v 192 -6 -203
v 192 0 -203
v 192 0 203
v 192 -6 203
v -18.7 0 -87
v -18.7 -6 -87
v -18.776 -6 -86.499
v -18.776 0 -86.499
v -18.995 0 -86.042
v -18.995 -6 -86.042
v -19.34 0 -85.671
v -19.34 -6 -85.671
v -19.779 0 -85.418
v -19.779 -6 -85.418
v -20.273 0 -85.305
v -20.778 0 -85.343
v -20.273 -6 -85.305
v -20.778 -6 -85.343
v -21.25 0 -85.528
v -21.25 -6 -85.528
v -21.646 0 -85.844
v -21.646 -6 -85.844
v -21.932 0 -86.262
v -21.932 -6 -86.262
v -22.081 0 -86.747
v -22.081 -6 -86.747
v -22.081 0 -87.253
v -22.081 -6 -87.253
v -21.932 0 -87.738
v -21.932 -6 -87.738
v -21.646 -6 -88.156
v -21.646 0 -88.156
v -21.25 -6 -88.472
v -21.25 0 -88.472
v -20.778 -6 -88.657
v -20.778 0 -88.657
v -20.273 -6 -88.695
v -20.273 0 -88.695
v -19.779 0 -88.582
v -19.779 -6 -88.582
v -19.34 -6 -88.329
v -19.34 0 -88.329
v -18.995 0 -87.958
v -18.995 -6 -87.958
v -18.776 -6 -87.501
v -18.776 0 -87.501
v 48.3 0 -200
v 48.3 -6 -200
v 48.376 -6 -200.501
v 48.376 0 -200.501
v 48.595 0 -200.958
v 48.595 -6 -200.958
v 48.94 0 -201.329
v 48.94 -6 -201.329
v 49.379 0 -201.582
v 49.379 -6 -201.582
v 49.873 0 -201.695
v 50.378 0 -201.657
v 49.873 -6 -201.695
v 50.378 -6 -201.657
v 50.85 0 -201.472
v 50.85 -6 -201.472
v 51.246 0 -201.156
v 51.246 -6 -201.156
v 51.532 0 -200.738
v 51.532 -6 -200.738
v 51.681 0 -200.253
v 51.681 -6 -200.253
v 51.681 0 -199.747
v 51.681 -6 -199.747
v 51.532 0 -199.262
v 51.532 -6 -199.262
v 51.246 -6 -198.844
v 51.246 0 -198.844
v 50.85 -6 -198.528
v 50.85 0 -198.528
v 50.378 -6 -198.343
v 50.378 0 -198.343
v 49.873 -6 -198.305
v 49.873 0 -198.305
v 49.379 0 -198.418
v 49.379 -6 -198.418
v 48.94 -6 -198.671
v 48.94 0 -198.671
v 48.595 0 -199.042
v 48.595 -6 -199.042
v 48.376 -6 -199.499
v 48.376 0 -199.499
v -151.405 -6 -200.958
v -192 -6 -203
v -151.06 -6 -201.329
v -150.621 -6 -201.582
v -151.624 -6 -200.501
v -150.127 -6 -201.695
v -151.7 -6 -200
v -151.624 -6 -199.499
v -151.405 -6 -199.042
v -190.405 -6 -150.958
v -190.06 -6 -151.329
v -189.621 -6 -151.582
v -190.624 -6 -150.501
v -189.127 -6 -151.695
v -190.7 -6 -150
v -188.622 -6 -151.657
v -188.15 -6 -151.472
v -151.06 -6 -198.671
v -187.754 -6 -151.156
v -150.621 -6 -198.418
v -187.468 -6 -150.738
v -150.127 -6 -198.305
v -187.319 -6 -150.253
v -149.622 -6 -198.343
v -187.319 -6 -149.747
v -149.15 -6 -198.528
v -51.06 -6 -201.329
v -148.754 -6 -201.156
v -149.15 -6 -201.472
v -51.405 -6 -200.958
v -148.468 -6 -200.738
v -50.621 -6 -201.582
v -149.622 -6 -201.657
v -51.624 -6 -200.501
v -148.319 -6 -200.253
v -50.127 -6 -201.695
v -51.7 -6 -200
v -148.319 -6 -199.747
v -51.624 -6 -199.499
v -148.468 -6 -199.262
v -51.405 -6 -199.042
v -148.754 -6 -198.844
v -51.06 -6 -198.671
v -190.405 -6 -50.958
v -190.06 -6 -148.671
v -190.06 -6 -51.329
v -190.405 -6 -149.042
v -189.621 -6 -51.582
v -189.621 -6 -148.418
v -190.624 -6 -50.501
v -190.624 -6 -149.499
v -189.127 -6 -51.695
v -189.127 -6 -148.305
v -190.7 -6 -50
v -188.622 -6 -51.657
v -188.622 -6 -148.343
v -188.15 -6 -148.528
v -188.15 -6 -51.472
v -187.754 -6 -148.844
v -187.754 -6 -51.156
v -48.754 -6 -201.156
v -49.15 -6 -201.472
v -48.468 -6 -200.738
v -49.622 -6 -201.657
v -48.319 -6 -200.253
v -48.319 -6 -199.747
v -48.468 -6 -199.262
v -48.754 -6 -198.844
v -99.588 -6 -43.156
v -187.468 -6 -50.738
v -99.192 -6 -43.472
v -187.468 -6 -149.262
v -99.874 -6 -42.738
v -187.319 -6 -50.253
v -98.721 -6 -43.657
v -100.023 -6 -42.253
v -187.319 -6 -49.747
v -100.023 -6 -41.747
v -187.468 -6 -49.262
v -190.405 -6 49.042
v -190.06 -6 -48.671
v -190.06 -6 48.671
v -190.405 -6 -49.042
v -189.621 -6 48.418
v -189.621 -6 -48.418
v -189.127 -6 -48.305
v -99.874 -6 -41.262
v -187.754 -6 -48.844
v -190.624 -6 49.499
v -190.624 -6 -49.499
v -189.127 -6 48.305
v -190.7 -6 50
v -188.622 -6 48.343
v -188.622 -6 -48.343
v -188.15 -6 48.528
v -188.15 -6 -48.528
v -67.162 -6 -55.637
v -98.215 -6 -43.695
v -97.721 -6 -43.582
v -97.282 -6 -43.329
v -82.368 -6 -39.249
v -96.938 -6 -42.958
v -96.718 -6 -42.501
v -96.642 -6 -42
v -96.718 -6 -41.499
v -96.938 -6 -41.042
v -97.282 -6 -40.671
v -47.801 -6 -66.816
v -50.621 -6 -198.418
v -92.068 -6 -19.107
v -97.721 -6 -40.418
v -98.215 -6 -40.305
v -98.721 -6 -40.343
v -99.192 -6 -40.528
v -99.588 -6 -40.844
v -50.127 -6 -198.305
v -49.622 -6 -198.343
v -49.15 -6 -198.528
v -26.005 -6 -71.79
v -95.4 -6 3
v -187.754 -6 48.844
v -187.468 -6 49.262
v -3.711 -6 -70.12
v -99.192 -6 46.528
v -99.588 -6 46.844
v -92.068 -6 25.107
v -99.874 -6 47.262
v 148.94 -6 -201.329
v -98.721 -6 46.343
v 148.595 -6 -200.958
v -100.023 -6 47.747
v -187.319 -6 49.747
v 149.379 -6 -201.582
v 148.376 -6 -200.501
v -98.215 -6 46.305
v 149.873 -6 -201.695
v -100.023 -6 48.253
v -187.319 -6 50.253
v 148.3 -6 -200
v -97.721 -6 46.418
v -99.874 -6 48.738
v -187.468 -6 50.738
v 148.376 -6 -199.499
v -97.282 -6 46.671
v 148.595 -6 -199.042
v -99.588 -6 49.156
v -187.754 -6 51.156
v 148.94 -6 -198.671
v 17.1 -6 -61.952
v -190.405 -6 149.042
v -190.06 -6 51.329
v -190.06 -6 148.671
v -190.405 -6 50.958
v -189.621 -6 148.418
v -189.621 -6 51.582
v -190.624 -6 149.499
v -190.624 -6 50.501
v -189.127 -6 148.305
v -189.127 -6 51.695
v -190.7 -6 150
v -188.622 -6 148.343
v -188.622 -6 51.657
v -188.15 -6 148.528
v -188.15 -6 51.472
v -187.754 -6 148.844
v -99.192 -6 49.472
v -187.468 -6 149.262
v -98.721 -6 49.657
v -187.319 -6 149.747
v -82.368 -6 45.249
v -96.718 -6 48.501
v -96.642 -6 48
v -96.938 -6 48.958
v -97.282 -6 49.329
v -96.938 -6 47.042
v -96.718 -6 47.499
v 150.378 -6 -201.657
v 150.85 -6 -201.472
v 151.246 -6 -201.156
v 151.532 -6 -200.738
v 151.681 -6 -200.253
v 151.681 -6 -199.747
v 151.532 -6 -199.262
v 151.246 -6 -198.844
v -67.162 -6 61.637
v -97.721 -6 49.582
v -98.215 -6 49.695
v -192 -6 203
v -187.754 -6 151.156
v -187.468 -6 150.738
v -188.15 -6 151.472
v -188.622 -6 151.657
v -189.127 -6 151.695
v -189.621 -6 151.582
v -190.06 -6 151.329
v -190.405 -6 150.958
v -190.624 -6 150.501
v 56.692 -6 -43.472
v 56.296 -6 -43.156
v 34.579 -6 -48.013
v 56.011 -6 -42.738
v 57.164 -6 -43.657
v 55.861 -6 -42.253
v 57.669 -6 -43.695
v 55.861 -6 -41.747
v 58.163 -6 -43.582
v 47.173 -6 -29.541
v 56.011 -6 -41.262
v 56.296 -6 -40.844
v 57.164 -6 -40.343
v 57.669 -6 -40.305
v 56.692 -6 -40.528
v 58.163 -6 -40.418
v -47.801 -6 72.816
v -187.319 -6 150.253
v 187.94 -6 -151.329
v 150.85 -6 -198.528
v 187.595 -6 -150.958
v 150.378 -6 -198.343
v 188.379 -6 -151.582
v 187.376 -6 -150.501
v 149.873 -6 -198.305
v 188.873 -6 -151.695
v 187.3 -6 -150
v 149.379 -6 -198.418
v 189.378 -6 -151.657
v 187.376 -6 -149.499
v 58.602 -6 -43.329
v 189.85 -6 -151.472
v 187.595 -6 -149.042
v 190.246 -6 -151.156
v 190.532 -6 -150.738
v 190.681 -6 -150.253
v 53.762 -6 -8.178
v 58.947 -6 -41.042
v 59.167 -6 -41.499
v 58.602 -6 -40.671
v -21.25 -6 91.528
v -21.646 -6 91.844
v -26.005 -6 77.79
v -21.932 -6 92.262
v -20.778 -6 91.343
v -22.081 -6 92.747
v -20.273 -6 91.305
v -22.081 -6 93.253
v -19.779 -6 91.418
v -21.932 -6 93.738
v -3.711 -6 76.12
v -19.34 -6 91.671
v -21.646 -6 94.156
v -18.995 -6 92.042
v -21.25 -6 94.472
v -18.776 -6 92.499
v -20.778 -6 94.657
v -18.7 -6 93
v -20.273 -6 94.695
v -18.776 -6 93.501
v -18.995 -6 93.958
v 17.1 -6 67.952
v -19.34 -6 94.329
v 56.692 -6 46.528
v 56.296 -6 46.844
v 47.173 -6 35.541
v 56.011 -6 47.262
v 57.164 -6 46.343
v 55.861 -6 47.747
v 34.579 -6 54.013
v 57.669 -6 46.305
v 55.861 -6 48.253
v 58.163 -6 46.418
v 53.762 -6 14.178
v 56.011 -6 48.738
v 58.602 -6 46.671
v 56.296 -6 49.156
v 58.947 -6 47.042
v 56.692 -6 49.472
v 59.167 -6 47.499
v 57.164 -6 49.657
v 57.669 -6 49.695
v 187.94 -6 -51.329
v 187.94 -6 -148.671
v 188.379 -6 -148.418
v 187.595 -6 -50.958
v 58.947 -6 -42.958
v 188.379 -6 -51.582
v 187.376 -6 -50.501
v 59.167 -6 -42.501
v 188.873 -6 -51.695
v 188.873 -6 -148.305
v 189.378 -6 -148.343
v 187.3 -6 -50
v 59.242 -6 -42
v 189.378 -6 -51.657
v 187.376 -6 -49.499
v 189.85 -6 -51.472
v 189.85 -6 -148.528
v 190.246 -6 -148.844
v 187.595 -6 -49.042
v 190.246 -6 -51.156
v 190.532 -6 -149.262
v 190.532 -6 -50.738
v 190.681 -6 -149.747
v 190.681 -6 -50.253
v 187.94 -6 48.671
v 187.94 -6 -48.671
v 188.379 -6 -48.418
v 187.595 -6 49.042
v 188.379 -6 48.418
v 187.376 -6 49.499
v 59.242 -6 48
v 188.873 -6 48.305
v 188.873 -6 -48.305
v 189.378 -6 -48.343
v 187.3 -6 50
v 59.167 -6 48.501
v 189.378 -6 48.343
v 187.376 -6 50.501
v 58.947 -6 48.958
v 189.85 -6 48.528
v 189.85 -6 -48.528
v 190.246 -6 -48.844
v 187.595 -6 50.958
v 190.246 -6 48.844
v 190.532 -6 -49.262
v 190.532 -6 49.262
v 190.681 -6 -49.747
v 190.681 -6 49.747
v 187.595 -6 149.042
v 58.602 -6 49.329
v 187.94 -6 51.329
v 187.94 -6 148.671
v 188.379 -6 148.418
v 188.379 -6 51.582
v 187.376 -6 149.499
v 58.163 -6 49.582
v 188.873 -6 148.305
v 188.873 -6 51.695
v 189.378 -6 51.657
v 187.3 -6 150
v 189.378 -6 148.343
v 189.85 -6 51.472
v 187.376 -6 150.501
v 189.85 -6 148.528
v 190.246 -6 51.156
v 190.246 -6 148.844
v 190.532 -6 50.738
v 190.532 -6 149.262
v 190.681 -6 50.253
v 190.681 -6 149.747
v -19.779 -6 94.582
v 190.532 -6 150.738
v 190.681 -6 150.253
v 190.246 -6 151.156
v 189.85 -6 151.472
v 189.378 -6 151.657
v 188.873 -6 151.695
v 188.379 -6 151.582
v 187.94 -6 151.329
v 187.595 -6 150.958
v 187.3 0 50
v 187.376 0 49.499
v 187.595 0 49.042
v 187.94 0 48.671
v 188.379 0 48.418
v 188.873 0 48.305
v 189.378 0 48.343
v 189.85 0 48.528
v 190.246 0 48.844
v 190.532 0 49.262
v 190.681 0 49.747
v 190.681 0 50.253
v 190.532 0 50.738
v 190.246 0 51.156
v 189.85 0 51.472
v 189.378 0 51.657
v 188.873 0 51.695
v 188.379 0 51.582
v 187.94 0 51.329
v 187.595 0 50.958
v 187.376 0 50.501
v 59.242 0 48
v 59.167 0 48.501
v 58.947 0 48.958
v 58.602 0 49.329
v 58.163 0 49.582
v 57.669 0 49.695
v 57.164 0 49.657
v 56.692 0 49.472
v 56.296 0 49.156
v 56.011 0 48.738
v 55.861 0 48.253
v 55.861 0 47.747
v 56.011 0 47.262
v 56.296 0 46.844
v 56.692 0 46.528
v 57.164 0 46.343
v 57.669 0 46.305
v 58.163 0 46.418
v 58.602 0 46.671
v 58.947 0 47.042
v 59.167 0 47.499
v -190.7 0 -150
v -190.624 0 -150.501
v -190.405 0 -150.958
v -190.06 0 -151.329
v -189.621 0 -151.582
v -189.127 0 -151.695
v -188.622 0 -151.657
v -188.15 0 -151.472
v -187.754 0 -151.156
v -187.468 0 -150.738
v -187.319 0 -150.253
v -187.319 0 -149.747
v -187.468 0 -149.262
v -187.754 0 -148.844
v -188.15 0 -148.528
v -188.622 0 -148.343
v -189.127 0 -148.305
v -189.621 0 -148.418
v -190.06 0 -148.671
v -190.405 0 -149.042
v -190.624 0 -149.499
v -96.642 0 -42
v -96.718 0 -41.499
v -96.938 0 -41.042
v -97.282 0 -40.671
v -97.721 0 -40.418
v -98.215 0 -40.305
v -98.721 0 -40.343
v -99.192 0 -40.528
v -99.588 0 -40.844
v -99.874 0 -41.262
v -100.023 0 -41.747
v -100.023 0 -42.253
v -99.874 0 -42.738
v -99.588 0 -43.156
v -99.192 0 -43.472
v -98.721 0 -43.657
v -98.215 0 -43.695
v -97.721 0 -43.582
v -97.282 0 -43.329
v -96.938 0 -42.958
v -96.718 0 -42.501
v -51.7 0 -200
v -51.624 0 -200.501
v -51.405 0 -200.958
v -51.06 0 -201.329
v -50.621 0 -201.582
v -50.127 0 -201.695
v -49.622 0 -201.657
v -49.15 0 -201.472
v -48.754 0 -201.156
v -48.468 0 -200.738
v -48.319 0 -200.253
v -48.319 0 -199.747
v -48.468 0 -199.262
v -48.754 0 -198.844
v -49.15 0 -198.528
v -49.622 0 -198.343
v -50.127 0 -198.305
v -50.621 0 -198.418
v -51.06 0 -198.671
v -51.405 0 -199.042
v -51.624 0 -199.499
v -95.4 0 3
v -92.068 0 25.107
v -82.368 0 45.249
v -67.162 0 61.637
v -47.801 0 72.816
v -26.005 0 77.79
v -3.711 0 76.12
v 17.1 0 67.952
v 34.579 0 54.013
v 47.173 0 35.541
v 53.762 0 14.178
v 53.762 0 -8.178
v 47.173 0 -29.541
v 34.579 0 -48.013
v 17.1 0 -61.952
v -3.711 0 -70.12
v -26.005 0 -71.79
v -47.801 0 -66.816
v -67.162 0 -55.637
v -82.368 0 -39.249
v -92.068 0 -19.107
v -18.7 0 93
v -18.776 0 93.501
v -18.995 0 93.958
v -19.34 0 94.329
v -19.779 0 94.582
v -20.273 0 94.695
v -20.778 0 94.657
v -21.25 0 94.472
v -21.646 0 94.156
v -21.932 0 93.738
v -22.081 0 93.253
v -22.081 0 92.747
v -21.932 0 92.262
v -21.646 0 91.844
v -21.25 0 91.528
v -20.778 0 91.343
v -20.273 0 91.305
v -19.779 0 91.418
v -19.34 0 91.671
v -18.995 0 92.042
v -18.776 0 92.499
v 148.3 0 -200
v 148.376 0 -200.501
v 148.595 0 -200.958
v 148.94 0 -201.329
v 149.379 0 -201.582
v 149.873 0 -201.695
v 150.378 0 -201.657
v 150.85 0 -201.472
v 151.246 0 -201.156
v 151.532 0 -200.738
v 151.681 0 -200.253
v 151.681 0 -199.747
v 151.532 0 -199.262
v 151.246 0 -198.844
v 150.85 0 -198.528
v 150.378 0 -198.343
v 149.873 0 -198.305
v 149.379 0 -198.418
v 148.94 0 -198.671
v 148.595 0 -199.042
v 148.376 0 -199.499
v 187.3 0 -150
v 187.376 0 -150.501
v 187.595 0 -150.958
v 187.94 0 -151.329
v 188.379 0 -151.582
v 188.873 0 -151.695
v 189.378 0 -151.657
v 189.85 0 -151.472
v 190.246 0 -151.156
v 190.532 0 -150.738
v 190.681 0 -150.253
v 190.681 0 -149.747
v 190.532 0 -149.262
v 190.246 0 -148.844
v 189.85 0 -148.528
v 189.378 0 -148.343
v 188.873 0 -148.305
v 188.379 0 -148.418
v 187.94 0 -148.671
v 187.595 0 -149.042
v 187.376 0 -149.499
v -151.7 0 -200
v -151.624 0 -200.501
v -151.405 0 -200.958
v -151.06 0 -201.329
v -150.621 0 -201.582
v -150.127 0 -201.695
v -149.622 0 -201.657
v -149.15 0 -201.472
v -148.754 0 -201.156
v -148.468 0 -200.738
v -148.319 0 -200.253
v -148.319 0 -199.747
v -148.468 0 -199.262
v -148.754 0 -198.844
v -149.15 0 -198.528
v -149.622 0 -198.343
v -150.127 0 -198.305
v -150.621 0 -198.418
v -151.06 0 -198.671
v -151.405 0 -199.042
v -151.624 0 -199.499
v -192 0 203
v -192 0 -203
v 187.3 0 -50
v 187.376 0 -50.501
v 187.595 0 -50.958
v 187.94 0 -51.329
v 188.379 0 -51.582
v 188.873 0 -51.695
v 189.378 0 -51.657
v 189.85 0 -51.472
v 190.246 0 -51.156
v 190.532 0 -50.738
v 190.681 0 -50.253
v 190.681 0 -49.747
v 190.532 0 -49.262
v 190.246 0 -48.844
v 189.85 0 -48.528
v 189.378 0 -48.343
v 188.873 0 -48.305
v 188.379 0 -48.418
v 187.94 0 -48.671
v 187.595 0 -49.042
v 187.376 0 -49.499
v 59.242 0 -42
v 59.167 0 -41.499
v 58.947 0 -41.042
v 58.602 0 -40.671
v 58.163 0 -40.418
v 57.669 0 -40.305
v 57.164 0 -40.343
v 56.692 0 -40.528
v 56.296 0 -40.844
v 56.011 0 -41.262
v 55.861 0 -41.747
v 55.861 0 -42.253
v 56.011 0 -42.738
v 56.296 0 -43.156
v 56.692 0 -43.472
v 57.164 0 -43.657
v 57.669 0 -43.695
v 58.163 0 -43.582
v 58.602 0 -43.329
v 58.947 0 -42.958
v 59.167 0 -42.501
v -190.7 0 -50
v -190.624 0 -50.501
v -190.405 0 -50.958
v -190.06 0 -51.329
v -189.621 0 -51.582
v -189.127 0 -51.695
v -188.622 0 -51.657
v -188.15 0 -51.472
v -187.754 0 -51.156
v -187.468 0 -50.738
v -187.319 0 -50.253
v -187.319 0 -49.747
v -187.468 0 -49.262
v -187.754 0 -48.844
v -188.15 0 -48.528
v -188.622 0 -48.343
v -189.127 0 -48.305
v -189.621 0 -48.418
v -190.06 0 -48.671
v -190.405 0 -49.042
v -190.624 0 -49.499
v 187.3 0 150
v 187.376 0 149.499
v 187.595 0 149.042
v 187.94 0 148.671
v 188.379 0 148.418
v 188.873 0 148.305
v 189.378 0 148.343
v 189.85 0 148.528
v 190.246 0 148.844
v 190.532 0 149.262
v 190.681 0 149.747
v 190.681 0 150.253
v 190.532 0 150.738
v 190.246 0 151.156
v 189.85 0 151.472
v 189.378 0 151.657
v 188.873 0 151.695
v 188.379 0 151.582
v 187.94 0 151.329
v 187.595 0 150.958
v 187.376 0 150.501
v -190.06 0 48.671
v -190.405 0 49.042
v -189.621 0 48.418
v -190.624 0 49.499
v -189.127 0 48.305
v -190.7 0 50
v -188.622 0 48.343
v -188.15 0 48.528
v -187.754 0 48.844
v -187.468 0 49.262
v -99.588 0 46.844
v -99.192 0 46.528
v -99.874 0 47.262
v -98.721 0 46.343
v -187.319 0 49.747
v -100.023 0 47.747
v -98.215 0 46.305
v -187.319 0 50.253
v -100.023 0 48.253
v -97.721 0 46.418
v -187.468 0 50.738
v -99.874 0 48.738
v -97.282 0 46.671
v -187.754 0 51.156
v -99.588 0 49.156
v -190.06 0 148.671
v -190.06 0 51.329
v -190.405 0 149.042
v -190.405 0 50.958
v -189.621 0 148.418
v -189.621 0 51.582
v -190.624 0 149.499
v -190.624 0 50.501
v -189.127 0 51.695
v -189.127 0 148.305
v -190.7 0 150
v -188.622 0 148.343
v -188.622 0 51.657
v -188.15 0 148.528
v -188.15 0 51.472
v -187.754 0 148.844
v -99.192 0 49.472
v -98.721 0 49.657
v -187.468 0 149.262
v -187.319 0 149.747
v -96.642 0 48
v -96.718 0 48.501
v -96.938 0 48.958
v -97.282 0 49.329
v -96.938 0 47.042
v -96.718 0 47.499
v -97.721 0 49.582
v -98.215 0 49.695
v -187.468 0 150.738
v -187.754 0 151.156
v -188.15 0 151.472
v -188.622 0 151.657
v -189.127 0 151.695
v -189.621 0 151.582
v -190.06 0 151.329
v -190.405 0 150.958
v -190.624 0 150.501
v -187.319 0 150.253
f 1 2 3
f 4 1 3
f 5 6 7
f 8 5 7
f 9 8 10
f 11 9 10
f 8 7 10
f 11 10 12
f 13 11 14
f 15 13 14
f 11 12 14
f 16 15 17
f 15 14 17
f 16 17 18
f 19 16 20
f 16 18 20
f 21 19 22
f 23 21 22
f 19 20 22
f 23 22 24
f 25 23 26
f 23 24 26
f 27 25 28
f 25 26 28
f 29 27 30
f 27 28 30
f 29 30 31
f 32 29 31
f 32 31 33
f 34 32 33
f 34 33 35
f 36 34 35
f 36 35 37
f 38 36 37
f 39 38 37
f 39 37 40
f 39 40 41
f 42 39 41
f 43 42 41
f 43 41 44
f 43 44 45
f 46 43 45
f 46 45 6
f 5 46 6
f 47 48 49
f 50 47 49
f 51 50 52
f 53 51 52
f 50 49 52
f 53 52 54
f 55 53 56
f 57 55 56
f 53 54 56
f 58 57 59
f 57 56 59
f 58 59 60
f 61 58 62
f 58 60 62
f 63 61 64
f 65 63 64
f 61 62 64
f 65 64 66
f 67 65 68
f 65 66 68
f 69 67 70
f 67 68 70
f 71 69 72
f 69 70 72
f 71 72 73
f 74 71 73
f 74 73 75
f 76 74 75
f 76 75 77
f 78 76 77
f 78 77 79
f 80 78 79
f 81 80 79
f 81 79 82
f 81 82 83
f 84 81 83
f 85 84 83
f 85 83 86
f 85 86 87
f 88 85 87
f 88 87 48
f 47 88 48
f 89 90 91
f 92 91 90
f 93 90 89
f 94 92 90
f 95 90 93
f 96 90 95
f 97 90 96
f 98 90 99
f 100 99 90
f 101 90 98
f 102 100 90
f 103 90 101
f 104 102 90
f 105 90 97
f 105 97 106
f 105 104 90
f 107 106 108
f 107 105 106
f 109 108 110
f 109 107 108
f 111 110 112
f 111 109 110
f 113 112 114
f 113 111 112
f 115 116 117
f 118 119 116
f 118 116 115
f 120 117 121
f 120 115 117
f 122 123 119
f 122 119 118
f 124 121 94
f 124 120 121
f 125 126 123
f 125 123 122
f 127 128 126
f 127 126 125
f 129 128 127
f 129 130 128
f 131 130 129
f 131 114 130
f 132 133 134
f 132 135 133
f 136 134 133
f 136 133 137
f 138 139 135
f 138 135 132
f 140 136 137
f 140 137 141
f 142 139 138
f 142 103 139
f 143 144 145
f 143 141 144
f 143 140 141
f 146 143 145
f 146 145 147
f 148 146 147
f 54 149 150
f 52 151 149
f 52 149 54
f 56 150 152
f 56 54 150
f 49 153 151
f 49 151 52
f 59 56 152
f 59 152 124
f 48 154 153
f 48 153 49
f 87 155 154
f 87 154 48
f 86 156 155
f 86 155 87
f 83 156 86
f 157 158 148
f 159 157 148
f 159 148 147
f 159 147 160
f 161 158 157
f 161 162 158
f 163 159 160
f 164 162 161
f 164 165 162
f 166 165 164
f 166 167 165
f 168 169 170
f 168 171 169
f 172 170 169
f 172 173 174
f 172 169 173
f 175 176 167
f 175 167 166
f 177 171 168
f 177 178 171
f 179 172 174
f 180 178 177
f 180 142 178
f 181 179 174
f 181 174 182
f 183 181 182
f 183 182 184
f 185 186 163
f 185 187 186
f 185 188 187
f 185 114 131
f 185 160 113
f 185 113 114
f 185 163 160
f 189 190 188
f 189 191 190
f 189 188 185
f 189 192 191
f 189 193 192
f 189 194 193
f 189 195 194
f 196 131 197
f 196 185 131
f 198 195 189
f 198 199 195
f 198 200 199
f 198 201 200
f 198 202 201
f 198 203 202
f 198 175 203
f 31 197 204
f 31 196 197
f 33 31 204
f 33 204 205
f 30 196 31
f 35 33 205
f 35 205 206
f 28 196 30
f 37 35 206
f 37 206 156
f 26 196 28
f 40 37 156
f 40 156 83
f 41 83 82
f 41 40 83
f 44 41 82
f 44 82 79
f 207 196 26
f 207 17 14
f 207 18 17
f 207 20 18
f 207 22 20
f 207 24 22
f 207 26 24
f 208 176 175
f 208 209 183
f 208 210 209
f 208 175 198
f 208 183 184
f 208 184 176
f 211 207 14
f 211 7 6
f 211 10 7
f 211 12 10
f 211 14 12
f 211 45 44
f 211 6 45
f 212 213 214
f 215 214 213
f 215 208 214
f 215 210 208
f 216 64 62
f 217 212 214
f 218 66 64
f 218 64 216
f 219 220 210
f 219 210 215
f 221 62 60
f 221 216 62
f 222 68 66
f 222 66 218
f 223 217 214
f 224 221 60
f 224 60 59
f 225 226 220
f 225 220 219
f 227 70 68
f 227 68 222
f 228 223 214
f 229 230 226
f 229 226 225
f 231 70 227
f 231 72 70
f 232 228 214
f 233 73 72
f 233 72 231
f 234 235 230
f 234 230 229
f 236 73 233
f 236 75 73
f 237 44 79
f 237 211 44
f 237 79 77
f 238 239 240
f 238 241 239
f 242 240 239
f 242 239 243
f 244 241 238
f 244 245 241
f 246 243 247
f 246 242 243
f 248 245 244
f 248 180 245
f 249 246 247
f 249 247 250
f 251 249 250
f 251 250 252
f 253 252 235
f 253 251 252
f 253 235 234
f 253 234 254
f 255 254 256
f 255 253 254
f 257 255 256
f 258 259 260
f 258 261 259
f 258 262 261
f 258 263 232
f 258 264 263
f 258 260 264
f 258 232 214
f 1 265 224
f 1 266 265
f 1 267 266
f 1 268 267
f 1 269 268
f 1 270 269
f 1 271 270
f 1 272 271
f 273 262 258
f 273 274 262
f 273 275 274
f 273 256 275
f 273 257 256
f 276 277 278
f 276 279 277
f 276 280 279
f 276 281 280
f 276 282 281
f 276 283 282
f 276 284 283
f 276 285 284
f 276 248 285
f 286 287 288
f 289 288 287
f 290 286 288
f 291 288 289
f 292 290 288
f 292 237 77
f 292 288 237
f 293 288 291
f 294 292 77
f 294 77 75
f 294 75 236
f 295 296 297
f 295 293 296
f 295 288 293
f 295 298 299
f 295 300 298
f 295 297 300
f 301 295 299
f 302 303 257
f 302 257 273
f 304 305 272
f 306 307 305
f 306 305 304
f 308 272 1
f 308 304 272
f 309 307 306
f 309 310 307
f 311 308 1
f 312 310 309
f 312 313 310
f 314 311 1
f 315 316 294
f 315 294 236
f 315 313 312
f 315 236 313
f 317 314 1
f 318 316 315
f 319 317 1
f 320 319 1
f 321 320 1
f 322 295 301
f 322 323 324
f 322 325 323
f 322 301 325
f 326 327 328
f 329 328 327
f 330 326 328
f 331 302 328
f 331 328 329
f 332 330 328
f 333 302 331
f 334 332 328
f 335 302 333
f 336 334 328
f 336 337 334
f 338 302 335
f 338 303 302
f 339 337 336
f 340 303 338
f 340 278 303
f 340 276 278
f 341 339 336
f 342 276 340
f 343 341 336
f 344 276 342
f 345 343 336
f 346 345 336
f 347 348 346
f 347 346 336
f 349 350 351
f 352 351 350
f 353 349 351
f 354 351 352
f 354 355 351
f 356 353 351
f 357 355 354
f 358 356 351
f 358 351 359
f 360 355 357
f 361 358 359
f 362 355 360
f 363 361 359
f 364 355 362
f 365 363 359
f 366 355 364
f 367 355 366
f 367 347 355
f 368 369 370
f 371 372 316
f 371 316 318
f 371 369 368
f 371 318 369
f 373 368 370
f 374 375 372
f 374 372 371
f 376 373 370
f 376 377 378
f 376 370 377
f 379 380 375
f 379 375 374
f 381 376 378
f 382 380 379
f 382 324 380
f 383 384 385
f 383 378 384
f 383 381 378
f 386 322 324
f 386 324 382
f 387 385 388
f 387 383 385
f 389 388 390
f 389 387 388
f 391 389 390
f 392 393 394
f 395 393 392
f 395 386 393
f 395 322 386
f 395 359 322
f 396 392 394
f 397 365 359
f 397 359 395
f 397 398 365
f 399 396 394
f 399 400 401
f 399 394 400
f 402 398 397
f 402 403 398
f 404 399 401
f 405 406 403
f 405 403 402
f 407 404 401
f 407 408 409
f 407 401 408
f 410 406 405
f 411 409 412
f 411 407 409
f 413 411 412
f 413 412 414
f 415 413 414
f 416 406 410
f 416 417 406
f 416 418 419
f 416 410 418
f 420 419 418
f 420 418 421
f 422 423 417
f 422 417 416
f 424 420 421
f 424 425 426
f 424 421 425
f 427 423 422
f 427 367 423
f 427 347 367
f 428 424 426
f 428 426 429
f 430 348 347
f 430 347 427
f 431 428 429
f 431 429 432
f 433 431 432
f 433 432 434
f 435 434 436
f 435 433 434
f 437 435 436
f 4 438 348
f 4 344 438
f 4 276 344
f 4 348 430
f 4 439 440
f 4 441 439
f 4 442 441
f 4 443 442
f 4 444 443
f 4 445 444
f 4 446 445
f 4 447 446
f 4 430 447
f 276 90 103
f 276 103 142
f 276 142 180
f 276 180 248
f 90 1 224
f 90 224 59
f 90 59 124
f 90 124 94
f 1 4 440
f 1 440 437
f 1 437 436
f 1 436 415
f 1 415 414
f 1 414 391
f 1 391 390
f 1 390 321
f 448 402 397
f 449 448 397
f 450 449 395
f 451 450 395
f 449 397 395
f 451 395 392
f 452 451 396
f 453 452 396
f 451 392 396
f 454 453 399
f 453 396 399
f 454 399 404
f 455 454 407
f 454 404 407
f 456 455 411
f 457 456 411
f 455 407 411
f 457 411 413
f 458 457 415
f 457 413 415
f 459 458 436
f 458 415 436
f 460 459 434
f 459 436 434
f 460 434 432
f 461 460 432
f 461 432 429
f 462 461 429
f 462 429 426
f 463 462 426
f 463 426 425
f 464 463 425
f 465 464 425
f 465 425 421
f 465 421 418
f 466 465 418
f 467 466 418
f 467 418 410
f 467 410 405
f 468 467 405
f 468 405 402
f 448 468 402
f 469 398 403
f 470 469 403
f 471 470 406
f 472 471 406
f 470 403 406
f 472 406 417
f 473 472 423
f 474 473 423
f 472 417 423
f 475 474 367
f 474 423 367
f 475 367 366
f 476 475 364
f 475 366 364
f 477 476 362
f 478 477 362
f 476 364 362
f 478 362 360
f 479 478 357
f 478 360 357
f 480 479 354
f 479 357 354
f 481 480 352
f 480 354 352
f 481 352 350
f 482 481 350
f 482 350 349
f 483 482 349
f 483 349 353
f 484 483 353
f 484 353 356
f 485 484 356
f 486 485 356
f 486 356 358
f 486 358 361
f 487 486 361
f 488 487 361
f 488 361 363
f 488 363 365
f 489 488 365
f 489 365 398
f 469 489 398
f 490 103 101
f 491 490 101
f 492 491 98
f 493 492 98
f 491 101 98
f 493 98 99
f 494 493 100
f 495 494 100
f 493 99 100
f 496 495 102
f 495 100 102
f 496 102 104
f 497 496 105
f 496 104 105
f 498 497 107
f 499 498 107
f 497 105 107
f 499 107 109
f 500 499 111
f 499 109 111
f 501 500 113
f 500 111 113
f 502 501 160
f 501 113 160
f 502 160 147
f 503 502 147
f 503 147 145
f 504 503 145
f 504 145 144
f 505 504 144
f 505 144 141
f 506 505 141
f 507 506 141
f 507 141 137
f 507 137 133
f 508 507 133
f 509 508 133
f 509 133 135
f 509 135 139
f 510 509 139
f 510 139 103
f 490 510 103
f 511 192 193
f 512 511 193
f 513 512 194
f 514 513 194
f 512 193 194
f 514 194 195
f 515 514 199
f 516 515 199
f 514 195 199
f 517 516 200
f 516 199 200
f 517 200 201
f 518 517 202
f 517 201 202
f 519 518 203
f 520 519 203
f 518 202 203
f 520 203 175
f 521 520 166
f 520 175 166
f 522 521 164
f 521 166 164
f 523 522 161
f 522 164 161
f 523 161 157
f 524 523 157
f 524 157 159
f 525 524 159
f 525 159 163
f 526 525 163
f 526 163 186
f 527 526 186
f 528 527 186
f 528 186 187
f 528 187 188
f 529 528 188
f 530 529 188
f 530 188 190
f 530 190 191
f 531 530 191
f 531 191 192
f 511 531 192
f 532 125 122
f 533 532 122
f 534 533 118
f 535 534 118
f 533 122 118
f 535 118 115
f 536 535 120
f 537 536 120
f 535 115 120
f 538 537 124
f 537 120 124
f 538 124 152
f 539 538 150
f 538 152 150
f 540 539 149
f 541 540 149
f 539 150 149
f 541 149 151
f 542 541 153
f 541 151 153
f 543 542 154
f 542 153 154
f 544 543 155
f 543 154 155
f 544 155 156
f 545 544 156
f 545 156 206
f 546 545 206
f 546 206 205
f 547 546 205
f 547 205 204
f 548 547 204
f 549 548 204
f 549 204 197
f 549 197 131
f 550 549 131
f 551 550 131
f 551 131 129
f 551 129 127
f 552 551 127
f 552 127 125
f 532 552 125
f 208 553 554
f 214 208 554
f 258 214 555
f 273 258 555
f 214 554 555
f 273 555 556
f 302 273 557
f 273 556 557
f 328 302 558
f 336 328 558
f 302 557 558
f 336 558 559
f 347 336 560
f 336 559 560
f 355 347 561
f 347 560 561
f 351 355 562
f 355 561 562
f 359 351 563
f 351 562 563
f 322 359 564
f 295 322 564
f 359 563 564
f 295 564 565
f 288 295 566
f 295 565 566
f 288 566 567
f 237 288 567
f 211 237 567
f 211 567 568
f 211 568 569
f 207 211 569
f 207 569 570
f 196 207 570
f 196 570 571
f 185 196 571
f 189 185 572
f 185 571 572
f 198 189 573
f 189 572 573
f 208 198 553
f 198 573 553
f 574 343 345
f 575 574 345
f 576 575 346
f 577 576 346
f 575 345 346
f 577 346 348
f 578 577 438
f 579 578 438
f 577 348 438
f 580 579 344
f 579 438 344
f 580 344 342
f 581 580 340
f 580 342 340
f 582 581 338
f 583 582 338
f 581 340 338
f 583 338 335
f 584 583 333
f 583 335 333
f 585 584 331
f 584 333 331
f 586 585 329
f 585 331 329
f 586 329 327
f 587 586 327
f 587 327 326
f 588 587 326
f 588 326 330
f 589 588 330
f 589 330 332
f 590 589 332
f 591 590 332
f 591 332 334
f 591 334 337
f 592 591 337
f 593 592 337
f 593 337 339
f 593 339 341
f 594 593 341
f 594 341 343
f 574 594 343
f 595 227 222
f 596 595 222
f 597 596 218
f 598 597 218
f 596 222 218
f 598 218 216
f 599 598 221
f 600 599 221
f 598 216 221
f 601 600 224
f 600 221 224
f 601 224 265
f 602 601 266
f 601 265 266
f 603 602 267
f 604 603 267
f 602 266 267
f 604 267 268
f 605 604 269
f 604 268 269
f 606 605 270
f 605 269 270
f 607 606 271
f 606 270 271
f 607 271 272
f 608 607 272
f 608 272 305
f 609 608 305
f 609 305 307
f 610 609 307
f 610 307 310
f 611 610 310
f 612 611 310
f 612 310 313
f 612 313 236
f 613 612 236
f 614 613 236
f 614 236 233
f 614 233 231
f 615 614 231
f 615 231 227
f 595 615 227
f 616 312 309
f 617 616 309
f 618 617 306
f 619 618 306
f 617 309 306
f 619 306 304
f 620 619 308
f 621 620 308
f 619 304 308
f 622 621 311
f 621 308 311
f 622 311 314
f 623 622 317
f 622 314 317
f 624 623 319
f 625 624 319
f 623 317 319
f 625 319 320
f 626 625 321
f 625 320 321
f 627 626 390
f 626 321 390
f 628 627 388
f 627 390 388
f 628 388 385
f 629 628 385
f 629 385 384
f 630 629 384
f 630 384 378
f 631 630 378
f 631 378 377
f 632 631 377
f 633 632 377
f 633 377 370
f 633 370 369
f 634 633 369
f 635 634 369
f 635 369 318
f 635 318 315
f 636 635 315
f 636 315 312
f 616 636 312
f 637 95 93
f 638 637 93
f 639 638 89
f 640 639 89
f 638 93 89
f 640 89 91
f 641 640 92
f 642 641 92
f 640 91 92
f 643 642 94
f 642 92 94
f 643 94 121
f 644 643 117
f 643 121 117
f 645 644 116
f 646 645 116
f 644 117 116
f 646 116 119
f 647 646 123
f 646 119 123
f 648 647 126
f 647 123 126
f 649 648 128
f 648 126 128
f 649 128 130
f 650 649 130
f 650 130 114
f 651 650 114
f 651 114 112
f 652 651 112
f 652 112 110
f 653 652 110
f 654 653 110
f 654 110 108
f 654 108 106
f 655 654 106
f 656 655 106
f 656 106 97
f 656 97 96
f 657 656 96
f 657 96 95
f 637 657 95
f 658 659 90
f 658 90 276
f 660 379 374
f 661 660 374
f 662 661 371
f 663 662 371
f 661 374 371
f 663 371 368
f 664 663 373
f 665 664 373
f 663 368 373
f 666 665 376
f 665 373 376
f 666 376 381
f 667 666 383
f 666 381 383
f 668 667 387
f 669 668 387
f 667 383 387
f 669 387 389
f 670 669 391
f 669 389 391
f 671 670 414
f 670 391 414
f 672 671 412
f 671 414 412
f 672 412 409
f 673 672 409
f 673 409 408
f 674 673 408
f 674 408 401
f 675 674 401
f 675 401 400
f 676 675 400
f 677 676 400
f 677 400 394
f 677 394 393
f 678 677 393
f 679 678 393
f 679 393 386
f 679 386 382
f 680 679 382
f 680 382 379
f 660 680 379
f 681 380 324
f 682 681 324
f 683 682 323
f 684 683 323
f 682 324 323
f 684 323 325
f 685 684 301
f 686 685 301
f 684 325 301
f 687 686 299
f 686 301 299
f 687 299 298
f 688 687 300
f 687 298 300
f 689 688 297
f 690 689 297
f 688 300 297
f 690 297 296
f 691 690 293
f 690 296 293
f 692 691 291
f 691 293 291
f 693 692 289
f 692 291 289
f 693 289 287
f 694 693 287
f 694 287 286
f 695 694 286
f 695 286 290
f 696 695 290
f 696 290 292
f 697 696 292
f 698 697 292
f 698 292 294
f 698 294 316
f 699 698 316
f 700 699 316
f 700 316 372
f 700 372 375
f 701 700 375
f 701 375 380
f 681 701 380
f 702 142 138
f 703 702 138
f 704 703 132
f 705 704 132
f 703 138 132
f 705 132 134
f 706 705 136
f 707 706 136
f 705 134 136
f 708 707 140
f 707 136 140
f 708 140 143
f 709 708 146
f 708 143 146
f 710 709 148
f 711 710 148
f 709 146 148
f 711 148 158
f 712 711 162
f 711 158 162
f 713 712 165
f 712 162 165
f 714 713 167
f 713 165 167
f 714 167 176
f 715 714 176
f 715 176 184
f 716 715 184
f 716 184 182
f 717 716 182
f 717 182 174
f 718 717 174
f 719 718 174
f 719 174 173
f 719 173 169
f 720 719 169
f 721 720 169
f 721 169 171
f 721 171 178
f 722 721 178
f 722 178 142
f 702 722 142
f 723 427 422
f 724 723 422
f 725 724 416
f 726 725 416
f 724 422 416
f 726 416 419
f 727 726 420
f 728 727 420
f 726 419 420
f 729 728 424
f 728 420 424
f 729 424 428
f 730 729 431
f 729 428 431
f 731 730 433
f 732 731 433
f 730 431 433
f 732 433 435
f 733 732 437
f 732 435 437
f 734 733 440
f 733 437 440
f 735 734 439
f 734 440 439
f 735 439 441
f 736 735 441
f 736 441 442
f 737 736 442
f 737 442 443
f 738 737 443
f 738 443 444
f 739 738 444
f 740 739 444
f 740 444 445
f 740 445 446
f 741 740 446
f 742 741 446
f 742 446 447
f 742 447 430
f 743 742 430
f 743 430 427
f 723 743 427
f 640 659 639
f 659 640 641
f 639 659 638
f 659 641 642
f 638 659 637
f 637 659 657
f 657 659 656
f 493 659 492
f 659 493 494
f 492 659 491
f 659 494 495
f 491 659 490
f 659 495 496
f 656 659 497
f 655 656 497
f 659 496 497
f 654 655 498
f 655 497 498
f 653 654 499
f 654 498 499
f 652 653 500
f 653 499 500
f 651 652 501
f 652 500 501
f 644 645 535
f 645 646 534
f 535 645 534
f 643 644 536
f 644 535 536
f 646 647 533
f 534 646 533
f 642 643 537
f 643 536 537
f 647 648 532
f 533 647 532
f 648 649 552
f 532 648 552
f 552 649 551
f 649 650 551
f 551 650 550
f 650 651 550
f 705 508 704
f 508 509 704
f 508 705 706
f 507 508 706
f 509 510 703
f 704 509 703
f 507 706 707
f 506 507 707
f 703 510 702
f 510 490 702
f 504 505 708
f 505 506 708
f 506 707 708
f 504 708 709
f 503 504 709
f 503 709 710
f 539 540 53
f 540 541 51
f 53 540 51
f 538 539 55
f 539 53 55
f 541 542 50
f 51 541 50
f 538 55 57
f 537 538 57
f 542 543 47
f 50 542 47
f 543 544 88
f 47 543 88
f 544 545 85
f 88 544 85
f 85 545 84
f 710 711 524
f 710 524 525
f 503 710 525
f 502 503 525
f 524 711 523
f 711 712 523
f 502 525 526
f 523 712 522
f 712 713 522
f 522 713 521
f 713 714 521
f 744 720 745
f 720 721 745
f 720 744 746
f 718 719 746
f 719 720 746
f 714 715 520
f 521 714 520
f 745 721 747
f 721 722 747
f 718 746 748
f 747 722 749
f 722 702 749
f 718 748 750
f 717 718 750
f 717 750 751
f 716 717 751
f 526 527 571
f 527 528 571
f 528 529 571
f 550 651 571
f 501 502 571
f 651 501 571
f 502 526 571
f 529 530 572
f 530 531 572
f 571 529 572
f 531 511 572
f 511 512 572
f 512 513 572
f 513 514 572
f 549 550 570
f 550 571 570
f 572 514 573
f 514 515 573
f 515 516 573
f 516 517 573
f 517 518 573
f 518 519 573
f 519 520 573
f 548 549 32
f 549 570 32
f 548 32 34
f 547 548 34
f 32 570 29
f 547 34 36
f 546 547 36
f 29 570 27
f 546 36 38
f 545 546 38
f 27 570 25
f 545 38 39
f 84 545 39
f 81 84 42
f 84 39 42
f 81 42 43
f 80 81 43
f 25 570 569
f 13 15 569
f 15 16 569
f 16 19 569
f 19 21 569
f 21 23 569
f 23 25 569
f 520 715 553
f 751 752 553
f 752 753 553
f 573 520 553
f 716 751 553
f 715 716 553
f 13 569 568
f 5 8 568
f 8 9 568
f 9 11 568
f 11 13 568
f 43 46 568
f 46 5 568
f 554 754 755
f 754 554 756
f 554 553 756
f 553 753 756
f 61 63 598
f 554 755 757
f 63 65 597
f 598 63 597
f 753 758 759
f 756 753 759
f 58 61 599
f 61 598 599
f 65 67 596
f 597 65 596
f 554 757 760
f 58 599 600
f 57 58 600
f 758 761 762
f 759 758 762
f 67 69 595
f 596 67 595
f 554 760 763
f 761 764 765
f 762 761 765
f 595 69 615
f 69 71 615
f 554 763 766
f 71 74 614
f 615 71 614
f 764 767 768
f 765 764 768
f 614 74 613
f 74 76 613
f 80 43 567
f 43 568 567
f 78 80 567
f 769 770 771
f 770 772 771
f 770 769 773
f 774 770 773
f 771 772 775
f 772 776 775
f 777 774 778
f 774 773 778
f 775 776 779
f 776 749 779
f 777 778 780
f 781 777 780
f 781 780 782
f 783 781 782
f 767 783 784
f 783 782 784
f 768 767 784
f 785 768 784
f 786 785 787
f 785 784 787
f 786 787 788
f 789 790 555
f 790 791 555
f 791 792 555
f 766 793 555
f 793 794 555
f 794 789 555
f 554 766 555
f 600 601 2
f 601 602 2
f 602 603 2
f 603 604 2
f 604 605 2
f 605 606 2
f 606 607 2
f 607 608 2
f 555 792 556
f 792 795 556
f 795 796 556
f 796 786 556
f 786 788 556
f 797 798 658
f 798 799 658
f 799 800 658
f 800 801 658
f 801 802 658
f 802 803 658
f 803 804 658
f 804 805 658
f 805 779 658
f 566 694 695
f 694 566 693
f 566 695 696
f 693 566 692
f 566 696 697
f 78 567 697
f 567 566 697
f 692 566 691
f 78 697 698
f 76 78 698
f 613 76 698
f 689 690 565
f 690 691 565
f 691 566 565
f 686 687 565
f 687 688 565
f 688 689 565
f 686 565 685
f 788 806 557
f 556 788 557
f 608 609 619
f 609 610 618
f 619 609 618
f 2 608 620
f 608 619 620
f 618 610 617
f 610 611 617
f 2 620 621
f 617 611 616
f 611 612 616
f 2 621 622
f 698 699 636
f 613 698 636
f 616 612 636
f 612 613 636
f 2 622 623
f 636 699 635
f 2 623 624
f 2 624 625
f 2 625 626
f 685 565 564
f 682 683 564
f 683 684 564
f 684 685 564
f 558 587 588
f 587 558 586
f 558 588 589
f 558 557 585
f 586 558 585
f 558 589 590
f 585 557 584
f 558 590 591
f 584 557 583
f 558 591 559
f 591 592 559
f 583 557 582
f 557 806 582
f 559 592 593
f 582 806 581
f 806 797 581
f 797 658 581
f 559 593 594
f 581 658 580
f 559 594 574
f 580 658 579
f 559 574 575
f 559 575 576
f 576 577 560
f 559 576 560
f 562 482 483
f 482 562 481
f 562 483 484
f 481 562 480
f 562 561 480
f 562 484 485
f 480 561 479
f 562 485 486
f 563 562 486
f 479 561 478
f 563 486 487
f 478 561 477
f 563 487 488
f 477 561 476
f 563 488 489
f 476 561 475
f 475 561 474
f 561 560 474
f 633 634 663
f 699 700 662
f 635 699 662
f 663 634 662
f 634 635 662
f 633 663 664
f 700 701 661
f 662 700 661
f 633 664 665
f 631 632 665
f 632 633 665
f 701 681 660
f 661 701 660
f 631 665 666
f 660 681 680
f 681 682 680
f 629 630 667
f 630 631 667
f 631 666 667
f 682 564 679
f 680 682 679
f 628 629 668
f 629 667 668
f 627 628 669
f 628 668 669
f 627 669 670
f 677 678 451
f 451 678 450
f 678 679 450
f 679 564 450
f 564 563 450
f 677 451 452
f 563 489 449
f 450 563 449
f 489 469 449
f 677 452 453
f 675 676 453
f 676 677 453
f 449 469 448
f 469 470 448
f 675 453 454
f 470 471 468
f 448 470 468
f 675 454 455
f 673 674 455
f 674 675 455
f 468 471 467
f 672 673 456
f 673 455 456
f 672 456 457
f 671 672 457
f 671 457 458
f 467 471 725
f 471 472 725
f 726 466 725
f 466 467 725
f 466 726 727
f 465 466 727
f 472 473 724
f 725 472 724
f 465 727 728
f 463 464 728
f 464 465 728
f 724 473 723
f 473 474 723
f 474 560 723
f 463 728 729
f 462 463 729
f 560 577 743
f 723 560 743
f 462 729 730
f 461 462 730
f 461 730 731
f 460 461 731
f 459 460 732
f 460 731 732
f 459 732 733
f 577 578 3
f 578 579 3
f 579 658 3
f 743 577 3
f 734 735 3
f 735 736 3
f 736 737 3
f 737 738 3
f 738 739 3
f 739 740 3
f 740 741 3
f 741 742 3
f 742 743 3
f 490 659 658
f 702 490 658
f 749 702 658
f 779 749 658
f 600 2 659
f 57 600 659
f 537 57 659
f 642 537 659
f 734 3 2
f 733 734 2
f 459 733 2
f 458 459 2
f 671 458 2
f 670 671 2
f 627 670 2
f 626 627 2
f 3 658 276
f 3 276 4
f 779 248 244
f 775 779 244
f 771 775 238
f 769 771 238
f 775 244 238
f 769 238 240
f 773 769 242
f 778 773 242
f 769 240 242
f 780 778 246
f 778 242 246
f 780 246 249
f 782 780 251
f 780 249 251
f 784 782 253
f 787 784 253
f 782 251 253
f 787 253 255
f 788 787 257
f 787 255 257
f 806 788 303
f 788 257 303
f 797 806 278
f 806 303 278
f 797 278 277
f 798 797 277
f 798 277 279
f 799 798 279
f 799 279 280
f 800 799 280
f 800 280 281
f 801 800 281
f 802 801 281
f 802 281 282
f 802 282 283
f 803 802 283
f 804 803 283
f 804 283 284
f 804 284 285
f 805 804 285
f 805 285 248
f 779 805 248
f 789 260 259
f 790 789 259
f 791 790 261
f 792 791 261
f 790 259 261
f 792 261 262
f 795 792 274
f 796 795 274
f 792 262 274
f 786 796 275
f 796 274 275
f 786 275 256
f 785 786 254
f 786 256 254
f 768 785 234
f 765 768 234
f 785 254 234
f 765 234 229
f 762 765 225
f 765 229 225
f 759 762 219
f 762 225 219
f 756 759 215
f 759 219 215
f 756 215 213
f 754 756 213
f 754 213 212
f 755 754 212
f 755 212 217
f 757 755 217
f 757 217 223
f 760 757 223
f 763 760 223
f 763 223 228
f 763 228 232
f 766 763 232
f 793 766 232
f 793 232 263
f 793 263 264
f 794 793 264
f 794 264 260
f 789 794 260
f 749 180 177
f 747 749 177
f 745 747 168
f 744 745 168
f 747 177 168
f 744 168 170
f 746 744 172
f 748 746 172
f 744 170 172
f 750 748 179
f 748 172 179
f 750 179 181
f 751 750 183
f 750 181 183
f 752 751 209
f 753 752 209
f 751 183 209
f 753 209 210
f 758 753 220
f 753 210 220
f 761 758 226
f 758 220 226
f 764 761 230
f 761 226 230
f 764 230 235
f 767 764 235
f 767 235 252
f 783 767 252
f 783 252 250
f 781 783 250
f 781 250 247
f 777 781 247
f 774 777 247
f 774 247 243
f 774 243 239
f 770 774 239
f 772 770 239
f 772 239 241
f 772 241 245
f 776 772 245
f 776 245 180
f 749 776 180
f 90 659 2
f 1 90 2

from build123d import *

# Parameters (mm, degrees)
F0_W     = 384
F0_H     = 406
F2_DEPTH = 6
F3_D     = 3.4
F5_D     = 3.4
F4_R     = 75
F6_DEPTH = 6
F8_D     = 3.4
F9_D     = 3.4
F10_D    = 3.4


# Not quite as in the source:
# - a feature names something its author has since deleted; it is built from what else it names


with BuildPart() as f2:
    # F0 (on Front) → F2 (new body)
    with BuildSketch(Plane.XZ):
        Rectangle(F0_W, F0_H)
    extrude(amount=F2_DEPTH)

    # F3 (through all)
    with Locations(Plane(origin=(0, 0, 0), x_dir=(1, 0, 0), z_dir=(0, 1, 0))):
        with Locations((189, -150), (189, -50), (189, 150), (150, 200), (-50, 200), (-150, 200), (-189, -50), (-189, -150), (-189, 50)):
            Hole(F3_D / 2)

    # F5 (through all)
    with Locations(Plane(origin=(0, 0, 0), x_dir=(-1, 0, 0), z_dir=(0, 1, 0))):
        with Locations((98.3422863406, 48), (20.4, -87), (-57.5422863406, 48), (98.3422863406, -42), (20.4, 93), (-57.5422863406, -42)):
            Hole(F5_D / 2)


with BuildPart() as f6:
    # F4 (on face) → F6 (new body)
    with BuildSketch(Plane(origin=(0, 0, 0), x_dir=(-1, 0, 0), z_dir=(0, 1, 0))):
        with Locations((20.4, 3)):
            Circle(F4_R)
    extrude(amount=-F6_DEPTH)


with BuildPart() as f2_1:
    add(f2.part)

    # F7: cut F6
    add(f6.part, mode=Mode.SUBTRACT)

    # F8 (through all)
    with Locations(Plane(origin=(0, 0, 0), x_dir=(1, 0, 0), z_dir=(0, 1, 0))):
        with Locations((-189, 150)):
            Hole(F8_D / 2)

    # F9 (through all)
    with Locations(Plane(origin=(0, 0, 0), x_dir=(1, 0, 0), z_dir=(0, 1, 0))):
        with Locations((189, 50)):
            Hole(F9_D / 2)

    # F10 (through all)
    with Locations(Plane(origin=(0, 0, 0), x_dir=(1, 0, 0), z_dir=(0, 1, 0))):
        with Locations((50, 200)):
            Hole(F10_D / 2)


solid = f2_1.part
